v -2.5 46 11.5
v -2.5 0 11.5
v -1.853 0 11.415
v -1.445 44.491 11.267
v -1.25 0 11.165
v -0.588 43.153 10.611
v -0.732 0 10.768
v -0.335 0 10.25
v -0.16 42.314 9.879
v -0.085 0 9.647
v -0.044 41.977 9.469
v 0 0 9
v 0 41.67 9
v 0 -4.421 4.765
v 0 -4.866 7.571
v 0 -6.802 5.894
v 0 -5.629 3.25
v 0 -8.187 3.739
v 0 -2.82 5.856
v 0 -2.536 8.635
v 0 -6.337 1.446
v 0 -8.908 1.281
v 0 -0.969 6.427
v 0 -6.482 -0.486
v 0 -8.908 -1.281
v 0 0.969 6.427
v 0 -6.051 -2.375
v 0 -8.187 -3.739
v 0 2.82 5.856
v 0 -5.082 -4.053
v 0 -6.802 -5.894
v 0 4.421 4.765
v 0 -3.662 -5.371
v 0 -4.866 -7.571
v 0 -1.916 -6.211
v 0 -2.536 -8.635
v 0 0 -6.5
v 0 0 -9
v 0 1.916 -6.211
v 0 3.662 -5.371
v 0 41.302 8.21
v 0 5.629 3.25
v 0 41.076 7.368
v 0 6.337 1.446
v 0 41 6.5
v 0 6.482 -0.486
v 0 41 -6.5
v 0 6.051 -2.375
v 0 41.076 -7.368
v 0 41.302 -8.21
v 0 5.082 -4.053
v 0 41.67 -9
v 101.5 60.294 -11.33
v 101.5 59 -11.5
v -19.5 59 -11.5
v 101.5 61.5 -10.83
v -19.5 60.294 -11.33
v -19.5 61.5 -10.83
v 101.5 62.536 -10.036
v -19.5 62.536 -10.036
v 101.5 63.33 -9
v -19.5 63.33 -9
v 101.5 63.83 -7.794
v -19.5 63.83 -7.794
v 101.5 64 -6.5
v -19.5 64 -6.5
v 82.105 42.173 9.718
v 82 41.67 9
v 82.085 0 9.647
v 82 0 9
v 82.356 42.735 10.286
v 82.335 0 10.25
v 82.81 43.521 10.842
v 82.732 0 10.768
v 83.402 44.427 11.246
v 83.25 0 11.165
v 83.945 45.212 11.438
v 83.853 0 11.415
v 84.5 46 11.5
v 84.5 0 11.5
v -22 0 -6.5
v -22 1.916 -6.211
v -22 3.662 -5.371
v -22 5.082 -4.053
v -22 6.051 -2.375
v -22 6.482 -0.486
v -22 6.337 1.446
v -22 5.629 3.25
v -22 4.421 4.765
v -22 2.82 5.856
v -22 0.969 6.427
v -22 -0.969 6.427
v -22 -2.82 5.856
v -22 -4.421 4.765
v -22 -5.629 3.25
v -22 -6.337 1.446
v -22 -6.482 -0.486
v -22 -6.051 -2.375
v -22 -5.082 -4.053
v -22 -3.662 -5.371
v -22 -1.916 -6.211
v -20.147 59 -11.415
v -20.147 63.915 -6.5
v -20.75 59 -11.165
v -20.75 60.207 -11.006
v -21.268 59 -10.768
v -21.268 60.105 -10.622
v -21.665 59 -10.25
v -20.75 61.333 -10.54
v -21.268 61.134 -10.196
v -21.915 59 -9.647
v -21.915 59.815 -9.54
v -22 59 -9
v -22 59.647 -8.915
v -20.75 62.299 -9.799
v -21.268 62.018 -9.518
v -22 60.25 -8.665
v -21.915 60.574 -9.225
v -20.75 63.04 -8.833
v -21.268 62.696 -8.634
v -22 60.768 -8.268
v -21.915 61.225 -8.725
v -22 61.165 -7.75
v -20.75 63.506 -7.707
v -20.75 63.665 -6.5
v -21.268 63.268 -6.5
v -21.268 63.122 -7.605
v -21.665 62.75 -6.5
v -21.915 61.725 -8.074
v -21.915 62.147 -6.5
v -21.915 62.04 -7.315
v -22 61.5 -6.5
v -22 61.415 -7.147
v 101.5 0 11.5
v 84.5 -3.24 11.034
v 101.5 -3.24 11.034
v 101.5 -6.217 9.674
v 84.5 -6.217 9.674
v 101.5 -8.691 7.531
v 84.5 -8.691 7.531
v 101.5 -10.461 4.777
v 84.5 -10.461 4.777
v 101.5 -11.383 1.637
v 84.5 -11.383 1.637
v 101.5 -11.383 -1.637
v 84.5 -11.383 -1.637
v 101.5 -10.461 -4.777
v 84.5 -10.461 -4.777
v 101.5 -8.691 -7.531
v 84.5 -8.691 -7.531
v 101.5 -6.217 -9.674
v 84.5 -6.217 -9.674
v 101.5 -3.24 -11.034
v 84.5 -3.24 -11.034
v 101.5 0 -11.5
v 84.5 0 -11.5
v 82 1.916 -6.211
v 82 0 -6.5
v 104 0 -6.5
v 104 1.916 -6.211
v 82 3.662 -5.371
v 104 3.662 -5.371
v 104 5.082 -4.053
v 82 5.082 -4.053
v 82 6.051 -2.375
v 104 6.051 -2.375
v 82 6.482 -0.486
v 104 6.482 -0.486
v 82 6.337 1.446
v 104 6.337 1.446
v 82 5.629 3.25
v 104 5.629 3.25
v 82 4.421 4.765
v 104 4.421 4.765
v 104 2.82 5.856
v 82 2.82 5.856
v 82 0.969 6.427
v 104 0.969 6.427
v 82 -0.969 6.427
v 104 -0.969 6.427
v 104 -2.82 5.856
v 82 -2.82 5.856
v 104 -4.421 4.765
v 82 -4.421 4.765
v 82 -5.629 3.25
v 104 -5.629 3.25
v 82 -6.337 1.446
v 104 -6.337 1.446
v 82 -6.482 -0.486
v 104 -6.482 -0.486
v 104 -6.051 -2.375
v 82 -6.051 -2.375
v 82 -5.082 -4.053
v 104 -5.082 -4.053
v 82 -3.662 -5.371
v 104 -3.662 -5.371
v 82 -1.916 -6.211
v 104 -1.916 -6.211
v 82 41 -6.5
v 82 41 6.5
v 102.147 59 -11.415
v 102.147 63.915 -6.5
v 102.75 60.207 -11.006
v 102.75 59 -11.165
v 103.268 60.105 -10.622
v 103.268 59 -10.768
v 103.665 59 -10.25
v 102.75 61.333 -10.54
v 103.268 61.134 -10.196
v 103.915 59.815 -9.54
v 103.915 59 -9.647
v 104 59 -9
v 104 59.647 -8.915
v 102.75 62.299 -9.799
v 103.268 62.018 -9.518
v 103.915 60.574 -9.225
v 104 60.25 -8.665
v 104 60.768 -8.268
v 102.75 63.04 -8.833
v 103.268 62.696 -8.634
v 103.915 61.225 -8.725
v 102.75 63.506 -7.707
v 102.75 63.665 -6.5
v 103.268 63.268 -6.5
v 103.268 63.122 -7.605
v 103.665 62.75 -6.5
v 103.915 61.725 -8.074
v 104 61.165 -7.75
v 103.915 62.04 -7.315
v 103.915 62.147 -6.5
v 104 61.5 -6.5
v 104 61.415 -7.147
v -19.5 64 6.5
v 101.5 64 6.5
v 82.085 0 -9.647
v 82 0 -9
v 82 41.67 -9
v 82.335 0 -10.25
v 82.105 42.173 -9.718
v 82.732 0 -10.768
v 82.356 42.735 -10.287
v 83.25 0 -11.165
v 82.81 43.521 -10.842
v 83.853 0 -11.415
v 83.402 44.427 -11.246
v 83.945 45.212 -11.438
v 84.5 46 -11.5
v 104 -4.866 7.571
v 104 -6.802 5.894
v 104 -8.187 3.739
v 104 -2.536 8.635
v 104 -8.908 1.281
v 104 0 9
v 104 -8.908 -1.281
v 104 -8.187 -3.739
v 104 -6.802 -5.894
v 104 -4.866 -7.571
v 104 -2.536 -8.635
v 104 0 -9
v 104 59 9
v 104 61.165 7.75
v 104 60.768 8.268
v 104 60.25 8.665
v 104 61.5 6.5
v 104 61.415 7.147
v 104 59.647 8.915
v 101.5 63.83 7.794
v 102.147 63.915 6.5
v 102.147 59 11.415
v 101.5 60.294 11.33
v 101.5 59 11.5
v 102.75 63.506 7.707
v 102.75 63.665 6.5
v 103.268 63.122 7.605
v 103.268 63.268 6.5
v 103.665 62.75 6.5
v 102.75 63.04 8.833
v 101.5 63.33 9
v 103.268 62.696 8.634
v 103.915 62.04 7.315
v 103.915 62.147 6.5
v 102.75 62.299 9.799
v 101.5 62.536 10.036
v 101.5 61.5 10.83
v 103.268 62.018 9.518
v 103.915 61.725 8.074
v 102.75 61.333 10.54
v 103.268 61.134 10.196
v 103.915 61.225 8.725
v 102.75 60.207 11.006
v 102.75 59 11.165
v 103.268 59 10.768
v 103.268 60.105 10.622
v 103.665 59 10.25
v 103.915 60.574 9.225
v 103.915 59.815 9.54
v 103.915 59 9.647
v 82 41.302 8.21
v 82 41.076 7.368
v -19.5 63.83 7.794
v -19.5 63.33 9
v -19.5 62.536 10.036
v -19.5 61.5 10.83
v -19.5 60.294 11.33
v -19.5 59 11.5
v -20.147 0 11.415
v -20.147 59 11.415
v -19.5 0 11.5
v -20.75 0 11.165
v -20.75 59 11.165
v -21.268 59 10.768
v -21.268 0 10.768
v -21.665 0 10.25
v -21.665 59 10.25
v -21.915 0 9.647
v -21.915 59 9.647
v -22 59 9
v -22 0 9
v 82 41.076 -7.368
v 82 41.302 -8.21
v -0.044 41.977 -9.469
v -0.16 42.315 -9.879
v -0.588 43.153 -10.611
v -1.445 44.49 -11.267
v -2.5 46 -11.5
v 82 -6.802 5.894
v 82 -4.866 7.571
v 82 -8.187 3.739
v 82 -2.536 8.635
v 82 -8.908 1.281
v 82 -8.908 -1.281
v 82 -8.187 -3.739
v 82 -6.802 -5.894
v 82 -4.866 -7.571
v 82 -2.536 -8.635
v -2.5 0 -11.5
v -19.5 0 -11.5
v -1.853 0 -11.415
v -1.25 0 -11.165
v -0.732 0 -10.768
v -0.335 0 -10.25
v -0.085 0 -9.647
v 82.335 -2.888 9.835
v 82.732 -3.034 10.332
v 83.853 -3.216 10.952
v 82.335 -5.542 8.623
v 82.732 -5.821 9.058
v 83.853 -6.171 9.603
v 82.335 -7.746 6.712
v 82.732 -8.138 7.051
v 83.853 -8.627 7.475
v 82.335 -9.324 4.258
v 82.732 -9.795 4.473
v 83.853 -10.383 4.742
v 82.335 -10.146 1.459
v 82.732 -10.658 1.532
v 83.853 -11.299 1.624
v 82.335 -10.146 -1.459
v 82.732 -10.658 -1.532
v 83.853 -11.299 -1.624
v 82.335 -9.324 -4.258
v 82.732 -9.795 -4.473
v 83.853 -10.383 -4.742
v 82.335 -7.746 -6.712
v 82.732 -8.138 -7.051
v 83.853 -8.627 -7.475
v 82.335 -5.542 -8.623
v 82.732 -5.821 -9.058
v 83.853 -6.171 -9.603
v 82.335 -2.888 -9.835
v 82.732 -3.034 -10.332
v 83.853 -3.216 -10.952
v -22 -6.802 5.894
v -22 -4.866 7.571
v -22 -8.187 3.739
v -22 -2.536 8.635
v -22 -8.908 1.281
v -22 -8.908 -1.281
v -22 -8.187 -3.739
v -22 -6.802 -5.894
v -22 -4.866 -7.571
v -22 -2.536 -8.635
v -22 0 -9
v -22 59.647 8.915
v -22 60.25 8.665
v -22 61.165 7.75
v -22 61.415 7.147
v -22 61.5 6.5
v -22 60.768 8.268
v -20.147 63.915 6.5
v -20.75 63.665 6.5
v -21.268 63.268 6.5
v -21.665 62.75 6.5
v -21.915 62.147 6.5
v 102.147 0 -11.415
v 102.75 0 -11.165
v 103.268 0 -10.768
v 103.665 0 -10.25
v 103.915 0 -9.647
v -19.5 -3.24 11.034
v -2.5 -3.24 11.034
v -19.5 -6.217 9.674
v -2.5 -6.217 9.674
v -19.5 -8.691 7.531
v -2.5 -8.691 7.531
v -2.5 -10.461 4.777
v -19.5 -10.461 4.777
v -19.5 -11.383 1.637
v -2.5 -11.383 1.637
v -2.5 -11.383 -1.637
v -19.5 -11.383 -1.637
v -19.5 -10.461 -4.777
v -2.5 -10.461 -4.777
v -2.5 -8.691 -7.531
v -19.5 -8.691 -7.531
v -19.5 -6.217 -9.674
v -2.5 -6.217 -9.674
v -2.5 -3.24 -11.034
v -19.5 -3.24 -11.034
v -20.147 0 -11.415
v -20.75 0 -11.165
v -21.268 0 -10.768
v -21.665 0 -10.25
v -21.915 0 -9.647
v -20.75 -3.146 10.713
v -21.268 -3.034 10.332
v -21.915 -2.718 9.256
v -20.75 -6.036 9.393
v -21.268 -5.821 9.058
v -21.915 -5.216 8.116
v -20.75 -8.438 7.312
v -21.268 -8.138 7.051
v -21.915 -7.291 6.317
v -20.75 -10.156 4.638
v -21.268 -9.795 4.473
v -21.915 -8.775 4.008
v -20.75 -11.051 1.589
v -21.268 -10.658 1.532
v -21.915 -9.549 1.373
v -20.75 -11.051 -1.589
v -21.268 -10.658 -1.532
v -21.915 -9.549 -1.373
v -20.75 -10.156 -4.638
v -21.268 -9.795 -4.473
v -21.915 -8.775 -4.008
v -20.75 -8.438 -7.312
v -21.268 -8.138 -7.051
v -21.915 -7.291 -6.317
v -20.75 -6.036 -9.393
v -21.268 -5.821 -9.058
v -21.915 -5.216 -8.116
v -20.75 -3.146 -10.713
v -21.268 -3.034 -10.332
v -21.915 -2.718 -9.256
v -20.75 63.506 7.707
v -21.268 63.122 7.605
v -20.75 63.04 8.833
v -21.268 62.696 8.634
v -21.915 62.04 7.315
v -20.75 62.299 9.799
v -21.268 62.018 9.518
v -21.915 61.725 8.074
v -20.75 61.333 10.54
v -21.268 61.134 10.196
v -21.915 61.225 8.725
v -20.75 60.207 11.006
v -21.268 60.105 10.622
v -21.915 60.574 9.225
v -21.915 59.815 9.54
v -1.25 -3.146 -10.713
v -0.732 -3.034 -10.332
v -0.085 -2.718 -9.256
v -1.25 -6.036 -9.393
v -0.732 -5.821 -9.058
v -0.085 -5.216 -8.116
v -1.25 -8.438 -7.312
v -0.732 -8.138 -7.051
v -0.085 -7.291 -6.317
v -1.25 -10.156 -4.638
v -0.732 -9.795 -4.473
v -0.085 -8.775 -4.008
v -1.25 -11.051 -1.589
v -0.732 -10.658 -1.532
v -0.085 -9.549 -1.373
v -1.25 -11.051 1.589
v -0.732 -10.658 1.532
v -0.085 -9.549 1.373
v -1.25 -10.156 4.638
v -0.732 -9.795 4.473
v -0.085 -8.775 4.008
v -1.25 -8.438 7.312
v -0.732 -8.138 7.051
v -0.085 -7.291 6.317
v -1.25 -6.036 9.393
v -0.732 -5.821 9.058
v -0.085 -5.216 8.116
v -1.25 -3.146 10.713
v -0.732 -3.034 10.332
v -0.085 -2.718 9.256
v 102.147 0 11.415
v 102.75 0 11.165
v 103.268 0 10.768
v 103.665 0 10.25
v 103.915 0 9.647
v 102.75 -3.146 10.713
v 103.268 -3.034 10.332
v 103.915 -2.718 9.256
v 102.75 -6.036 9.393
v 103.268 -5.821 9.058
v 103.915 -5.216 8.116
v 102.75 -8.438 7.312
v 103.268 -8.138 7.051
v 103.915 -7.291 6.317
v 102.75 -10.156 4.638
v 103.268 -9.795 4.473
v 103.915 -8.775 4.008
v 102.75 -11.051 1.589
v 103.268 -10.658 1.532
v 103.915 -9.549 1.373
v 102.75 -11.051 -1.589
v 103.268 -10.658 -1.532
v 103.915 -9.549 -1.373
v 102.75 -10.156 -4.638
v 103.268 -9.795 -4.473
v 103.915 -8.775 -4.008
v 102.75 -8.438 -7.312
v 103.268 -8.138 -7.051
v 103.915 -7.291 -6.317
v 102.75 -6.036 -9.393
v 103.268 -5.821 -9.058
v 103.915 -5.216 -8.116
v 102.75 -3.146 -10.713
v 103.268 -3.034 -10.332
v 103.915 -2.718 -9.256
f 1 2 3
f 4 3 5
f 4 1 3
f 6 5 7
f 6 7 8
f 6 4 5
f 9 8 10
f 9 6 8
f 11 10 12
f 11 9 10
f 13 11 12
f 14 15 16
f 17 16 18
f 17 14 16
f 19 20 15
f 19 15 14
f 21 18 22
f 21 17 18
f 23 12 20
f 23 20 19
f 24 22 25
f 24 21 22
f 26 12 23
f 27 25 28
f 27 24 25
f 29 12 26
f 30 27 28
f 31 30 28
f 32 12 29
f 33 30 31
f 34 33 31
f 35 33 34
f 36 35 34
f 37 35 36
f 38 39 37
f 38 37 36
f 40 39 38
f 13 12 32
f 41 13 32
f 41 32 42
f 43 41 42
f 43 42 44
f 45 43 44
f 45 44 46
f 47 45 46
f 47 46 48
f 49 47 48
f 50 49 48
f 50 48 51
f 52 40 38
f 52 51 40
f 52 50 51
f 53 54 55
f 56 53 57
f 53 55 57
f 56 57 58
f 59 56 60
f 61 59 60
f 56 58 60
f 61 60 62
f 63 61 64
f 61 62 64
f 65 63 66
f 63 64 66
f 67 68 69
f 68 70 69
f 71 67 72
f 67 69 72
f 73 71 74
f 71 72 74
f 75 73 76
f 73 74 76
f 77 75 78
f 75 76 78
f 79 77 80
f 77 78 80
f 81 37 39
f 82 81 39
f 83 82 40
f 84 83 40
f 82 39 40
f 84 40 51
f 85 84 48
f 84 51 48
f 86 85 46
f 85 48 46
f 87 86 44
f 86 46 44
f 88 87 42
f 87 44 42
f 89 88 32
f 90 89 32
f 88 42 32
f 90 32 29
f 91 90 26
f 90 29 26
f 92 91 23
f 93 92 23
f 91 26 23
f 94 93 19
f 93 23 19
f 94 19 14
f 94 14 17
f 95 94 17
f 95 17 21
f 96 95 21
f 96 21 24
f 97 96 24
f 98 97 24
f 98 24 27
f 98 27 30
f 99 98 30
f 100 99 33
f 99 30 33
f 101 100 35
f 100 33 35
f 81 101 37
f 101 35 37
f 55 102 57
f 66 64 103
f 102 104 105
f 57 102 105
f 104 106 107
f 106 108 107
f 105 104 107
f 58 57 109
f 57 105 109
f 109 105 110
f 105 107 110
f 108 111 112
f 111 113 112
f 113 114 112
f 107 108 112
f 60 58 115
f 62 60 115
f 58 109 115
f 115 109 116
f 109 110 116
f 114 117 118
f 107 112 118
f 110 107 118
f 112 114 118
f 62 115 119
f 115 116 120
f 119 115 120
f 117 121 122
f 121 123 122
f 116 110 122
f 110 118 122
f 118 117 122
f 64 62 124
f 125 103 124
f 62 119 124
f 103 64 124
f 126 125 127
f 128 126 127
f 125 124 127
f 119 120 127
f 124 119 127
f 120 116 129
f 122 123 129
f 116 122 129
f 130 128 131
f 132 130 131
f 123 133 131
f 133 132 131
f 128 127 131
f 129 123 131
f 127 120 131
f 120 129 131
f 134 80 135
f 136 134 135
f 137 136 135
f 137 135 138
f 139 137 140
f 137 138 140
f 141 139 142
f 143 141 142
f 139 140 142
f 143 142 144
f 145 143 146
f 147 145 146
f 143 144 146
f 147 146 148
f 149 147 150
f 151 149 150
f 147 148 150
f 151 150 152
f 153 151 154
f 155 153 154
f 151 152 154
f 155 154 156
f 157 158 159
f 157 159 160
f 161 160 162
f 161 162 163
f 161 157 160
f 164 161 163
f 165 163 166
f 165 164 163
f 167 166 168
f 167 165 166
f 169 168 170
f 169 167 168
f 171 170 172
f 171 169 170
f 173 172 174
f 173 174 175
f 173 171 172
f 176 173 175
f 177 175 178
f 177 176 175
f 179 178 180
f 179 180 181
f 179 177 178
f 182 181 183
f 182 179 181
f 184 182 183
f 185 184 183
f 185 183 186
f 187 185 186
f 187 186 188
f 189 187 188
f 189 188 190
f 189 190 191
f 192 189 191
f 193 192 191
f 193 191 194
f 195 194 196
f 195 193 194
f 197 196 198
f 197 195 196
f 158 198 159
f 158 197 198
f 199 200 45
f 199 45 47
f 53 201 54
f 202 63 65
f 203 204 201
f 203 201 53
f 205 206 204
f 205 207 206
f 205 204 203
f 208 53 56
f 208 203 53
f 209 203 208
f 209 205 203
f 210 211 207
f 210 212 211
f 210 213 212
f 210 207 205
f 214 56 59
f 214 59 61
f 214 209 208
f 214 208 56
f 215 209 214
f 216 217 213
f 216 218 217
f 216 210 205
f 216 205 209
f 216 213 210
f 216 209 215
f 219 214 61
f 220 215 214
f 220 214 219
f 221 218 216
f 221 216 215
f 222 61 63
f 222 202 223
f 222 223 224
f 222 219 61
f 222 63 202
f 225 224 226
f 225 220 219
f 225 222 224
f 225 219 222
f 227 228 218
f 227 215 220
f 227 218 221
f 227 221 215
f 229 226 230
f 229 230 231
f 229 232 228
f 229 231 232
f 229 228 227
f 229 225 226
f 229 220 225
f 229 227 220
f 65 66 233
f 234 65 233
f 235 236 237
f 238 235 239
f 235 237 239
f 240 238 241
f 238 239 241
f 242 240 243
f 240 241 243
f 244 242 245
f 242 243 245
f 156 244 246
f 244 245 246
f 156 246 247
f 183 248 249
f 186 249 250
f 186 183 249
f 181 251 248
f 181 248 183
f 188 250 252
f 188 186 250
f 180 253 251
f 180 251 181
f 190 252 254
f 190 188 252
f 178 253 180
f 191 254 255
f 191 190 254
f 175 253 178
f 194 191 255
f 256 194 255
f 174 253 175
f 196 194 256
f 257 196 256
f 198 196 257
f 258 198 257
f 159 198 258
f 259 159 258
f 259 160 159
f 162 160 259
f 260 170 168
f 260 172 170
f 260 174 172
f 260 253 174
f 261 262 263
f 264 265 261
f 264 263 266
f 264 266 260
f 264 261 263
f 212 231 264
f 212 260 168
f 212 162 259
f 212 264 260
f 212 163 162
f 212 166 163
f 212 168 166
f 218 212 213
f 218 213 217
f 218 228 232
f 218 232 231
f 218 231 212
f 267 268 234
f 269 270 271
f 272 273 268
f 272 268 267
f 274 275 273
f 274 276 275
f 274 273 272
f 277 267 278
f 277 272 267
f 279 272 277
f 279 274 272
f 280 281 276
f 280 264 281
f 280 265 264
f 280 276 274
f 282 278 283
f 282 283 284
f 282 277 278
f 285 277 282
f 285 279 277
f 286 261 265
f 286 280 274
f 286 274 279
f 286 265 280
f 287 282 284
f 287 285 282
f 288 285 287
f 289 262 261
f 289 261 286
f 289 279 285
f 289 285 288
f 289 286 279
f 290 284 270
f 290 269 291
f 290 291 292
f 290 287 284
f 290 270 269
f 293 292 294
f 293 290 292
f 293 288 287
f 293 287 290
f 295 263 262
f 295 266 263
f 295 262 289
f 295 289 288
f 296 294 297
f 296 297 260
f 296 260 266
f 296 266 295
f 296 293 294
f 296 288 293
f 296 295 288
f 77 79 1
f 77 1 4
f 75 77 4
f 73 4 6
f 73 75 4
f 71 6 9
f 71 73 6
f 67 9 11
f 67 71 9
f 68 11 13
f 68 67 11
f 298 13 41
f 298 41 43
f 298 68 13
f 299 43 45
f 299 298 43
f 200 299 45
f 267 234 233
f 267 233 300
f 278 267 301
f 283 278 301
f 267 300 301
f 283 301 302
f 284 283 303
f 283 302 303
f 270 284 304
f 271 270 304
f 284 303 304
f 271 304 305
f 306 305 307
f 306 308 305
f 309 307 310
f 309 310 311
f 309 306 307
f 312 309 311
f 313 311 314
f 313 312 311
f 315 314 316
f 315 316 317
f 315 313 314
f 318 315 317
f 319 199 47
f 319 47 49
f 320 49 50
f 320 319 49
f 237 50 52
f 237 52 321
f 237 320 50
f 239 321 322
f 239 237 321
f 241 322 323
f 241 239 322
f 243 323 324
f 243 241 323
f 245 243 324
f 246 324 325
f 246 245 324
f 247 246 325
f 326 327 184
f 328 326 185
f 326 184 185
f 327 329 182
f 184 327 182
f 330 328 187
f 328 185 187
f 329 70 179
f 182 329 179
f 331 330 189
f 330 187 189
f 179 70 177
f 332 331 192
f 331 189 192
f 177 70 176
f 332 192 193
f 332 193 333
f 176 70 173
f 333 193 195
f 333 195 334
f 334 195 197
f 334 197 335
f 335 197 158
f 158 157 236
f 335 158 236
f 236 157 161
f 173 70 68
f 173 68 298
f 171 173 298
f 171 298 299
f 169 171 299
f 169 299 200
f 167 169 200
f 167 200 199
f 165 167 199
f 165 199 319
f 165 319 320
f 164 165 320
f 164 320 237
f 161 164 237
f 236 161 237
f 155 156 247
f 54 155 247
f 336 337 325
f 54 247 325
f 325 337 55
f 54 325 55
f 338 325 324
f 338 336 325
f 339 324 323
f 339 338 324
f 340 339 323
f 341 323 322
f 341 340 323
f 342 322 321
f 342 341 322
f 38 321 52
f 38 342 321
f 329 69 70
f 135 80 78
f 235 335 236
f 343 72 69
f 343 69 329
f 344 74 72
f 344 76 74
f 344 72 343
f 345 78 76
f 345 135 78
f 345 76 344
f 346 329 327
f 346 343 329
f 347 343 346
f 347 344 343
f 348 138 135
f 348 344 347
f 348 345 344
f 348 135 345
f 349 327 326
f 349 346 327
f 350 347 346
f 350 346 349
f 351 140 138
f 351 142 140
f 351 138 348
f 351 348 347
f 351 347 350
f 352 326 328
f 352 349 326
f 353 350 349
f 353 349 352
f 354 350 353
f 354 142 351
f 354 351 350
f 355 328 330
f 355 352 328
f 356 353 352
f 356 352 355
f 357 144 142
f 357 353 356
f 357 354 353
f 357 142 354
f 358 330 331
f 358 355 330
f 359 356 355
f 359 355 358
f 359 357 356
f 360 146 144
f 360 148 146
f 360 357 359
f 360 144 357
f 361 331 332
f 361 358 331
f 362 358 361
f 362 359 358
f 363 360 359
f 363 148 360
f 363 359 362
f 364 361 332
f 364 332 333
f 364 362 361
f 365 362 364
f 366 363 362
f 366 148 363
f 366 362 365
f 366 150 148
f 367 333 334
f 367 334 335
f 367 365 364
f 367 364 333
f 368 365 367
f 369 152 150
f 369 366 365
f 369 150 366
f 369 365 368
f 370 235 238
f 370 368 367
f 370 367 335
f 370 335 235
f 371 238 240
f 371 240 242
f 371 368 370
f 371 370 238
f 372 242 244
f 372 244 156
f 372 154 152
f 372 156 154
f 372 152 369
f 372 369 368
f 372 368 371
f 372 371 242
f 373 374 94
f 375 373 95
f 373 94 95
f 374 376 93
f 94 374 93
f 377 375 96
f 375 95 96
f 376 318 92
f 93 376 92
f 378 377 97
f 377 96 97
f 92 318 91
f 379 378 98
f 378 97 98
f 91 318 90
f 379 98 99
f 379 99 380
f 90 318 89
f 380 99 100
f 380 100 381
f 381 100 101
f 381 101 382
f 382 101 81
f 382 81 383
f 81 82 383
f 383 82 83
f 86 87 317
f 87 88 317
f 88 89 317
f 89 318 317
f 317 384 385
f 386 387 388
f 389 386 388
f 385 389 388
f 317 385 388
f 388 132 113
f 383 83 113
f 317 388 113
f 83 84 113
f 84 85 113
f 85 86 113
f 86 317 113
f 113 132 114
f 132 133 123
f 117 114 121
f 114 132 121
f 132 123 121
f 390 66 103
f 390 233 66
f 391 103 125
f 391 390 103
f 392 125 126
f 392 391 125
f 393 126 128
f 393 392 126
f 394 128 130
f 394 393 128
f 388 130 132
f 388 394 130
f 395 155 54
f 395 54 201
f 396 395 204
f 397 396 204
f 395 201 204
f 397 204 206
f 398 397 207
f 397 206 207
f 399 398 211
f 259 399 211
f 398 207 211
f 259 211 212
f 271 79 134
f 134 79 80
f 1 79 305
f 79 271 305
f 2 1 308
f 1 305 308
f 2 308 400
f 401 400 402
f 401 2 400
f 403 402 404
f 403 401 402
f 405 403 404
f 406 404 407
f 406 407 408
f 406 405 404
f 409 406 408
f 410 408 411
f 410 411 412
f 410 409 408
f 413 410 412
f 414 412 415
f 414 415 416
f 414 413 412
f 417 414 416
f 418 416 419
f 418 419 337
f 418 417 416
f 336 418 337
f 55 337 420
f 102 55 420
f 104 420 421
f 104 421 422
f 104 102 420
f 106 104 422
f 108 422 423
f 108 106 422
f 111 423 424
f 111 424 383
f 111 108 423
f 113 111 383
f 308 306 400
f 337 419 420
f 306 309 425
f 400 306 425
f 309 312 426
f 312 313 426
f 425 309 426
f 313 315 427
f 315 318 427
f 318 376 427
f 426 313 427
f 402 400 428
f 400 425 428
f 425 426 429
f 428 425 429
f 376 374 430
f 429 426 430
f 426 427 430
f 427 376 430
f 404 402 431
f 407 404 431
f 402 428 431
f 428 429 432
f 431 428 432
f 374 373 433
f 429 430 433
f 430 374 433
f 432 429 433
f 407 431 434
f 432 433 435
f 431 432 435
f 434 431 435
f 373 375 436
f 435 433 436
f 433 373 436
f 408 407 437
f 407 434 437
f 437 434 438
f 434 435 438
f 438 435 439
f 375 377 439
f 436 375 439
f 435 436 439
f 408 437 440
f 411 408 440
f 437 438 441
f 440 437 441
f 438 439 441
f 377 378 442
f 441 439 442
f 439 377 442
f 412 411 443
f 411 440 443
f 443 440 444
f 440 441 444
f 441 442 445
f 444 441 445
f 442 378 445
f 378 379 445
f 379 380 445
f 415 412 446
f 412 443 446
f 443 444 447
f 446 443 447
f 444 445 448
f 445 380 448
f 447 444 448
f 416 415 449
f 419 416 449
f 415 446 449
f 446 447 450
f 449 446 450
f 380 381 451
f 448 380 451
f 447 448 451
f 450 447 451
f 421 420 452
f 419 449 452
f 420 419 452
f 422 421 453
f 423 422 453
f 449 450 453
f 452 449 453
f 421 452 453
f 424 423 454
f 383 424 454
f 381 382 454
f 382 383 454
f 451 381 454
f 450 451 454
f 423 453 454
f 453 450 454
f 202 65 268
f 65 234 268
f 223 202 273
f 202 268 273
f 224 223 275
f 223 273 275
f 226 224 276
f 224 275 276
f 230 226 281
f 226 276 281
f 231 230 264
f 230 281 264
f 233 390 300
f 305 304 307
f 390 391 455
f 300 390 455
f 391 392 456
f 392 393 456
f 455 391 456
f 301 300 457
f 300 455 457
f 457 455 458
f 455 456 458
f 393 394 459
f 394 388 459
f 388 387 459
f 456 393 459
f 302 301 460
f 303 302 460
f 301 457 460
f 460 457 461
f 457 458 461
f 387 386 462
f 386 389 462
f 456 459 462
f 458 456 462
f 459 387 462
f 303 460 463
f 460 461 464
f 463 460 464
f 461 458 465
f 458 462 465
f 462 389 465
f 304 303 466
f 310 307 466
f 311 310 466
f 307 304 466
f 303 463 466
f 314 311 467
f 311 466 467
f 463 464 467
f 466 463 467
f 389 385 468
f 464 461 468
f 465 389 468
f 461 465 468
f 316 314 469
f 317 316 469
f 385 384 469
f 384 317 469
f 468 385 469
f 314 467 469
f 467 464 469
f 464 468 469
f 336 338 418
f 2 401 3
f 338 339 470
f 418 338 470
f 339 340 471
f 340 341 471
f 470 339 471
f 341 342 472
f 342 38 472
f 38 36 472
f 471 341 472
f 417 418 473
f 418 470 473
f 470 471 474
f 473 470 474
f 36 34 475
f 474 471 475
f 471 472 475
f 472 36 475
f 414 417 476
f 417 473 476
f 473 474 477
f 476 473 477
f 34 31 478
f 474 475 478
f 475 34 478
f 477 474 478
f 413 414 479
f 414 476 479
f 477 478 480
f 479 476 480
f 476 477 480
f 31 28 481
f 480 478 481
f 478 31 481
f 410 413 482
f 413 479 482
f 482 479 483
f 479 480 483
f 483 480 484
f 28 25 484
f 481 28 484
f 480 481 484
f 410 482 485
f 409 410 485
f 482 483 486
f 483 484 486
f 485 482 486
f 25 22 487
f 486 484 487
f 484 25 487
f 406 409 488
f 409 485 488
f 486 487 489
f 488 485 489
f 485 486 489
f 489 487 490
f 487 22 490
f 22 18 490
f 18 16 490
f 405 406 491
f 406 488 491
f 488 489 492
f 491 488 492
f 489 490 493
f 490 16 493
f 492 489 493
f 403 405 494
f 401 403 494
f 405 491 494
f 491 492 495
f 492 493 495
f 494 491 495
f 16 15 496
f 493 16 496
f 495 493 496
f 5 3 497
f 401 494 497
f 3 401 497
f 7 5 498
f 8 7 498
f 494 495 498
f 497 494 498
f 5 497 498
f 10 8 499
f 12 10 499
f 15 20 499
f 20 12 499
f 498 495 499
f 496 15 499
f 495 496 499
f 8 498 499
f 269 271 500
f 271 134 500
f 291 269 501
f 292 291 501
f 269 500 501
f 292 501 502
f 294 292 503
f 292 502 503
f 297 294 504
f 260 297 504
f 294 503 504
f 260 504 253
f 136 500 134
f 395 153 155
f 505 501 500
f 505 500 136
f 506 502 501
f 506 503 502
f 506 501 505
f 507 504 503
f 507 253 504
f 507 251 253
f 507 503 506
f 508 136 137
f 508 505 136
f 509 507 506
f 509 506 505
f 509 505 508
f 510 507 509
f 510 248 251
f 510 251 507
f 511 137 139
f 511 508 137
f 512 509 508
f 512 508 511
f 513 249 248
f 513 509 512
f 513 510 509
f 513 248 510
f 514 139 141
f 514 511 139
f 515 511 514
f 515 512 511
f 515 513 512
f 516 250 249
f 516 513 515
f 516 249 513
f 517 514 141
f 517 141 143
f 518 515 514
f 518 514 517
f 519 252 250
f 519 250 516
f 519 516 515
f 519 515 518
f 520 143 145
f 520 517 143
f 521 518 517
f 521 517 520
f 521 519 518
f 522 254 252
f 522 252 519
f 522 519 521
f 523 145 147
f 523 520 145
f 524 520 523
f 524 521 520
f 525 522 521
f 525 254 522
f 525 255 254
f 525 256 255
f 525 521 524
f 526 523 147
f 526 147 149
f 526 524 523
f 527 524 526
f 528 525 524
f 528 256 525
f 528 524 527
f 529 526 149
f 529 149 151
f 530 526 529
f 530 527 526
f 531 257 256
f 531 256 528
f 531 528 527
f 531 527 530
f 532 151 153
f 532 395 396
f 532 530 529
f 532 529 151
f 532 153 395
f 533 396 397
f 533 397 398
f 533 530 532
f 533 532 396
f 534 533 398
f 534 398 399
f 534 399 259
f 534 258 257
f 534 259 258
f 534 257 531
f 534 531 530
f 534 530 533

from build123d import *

# Parameters (mm, degrees)
SKETCH1_R            = 6.5
BOSS_EXTRUDE1_DEPTH  = 22
BOSS_EXTRUDE3_START  = 82
BOSS_EXTRUDE3_DEPTH  = 82
FILLET3_R            = 2.5
FILLET3_OF_MIRROR1_R = 2.5


with BuildPart() as part:
    # Sketch1 → Boss-Extrude1 (new body)
    with BuildSketch(Plane(origin=(0, 0, 0), x_dir=(0, 0, -1), z_dir=(1, 0, 0))):
        with BuildLine():
            ThreePointArc((-11.500000000000002, 5.047646664e-08), (-2.523822962e-08, -11.500000000000002), (11.500000000000002, -2.82e-15))
            Line((11.500000000000002, 0), (11.499999999999998, 59.00000000000001))
            ThreePointArc((11.499999999999998, 59.00000000000001), (10.035533905932727, 62.53553390593273), (6.5, 63.999999999999986))
            Line((6.5, 63.999999999999986), (-6.5, 64))
            ThreePointArc((-6.5, 64), (-10.035533905932738, 62.53553390593274), (-11.5, 59))
            Line((-11.5, 59), (-11.5, 5.047646567e-08))
        make_face()
        Circle(SKETCH1_R, mode=Mode.SUBTRACT)
    boss_extrude1 = extrude(amount=-BOSS_EXTRUDE1_DEPTH)

    # Sketch1<4> → Boss-Extrude3 (add)
    with BuildSketch(Plane(origin=(0, 0, 0), x_dir=(0, 0, -1), z_dir=(1, 0, 0)).offset(BOSS_EXTRUDE3_START)):
        with BuildLine():
            Line((-11.5, 58.99999999999999), (-11.5, 46))
            ThreePointArc((-11.499999999999996, 46), (-10.035533905932734, 42.46446609406726), (-6.499999999999998, 41))
            Line((-6.499999999999997, 41), (6.500000000000003, 41))
            ThreePointArc((6.500000000000003, 41), (10.035533905932741, 42.46446609406726), (11.500000000000004, 46))
            Line((11.499999999999998, 46), (11.499999999999998, 59.00000000000001))
            ThreePointArc((11.499999999999998, 59.00000000000001), (10.035533905932727, 62.53553390593273), (6.5, 63.999999999999986))
            Line((6.5, 63.999999999999986), (-6.5, 64))
            ThreePointArc((-6.5, 64), (-10.035533905932738, 62.53553390593274), (-11.5, 59))
        make_face()
    extrude(amount=-BOSS_EXTRUDE3_DEPTH)

    # Fillet3
    fillet3_edges = [part.edges().sort_by_distance(p)[0] for p in [
        (-22, -11.500000000000002, 2.523823384e-08),
        (-22, 29.500000025238233, 11.5),
        (-22, 62.53553390593274, 10.035533905932738),
        (-22, 63.99999999999999, 0),
        (-22, 62.53553390593273, -10.035533905932729),
        (-22, 29.500000000000004, -11.5),
        (0, 23, -11.5),
        (0, -11.500000000000002, 2.523823384e-08),
        (0, 23.000000025238236, 11.5),
    ]]
    fillet(fillet3_edges, radius=FILLET3_R)

    # Mirror1: Boss-Extrude1 across plane
    add(boss_extrude1.mirror(Plane(origin=(41.00000000000001, 0, 0), x_dir=(0, 0, 1), z_dir=(1, 0, 0))))

    # Fillet3 of Mirror1
    fillet3_of_mirror1_edges = [part.edges().sort_by_distance(p)[0] for p in [
        (104.00000000000001, -11.500000000000002, 2.523823384e-08),
        (104.00000000000001, 29.500000025238233, 11.5),
        (104.00000000000001, 62.53553390593274, 10.035533905932738),
        (104.00000000000001, 63.99999999999999, 0),
        (104.00000000000001, 62.53553390593273, -10.035533905932729),
        (104.00000000000001, 29.500000000000004, -11.5),
        (82.00000000000001, 23, -11.5),
        (82.00000000000001, -11.500000000000002, 2.523823384e-08),
        (82.00000000000001, 23.000000025238236, 11.5),
    ]]
    fillet(fillet3_of_mirror1_edges, radius=FILLET3_OF_MIRROR1_R)


solid = part.part
